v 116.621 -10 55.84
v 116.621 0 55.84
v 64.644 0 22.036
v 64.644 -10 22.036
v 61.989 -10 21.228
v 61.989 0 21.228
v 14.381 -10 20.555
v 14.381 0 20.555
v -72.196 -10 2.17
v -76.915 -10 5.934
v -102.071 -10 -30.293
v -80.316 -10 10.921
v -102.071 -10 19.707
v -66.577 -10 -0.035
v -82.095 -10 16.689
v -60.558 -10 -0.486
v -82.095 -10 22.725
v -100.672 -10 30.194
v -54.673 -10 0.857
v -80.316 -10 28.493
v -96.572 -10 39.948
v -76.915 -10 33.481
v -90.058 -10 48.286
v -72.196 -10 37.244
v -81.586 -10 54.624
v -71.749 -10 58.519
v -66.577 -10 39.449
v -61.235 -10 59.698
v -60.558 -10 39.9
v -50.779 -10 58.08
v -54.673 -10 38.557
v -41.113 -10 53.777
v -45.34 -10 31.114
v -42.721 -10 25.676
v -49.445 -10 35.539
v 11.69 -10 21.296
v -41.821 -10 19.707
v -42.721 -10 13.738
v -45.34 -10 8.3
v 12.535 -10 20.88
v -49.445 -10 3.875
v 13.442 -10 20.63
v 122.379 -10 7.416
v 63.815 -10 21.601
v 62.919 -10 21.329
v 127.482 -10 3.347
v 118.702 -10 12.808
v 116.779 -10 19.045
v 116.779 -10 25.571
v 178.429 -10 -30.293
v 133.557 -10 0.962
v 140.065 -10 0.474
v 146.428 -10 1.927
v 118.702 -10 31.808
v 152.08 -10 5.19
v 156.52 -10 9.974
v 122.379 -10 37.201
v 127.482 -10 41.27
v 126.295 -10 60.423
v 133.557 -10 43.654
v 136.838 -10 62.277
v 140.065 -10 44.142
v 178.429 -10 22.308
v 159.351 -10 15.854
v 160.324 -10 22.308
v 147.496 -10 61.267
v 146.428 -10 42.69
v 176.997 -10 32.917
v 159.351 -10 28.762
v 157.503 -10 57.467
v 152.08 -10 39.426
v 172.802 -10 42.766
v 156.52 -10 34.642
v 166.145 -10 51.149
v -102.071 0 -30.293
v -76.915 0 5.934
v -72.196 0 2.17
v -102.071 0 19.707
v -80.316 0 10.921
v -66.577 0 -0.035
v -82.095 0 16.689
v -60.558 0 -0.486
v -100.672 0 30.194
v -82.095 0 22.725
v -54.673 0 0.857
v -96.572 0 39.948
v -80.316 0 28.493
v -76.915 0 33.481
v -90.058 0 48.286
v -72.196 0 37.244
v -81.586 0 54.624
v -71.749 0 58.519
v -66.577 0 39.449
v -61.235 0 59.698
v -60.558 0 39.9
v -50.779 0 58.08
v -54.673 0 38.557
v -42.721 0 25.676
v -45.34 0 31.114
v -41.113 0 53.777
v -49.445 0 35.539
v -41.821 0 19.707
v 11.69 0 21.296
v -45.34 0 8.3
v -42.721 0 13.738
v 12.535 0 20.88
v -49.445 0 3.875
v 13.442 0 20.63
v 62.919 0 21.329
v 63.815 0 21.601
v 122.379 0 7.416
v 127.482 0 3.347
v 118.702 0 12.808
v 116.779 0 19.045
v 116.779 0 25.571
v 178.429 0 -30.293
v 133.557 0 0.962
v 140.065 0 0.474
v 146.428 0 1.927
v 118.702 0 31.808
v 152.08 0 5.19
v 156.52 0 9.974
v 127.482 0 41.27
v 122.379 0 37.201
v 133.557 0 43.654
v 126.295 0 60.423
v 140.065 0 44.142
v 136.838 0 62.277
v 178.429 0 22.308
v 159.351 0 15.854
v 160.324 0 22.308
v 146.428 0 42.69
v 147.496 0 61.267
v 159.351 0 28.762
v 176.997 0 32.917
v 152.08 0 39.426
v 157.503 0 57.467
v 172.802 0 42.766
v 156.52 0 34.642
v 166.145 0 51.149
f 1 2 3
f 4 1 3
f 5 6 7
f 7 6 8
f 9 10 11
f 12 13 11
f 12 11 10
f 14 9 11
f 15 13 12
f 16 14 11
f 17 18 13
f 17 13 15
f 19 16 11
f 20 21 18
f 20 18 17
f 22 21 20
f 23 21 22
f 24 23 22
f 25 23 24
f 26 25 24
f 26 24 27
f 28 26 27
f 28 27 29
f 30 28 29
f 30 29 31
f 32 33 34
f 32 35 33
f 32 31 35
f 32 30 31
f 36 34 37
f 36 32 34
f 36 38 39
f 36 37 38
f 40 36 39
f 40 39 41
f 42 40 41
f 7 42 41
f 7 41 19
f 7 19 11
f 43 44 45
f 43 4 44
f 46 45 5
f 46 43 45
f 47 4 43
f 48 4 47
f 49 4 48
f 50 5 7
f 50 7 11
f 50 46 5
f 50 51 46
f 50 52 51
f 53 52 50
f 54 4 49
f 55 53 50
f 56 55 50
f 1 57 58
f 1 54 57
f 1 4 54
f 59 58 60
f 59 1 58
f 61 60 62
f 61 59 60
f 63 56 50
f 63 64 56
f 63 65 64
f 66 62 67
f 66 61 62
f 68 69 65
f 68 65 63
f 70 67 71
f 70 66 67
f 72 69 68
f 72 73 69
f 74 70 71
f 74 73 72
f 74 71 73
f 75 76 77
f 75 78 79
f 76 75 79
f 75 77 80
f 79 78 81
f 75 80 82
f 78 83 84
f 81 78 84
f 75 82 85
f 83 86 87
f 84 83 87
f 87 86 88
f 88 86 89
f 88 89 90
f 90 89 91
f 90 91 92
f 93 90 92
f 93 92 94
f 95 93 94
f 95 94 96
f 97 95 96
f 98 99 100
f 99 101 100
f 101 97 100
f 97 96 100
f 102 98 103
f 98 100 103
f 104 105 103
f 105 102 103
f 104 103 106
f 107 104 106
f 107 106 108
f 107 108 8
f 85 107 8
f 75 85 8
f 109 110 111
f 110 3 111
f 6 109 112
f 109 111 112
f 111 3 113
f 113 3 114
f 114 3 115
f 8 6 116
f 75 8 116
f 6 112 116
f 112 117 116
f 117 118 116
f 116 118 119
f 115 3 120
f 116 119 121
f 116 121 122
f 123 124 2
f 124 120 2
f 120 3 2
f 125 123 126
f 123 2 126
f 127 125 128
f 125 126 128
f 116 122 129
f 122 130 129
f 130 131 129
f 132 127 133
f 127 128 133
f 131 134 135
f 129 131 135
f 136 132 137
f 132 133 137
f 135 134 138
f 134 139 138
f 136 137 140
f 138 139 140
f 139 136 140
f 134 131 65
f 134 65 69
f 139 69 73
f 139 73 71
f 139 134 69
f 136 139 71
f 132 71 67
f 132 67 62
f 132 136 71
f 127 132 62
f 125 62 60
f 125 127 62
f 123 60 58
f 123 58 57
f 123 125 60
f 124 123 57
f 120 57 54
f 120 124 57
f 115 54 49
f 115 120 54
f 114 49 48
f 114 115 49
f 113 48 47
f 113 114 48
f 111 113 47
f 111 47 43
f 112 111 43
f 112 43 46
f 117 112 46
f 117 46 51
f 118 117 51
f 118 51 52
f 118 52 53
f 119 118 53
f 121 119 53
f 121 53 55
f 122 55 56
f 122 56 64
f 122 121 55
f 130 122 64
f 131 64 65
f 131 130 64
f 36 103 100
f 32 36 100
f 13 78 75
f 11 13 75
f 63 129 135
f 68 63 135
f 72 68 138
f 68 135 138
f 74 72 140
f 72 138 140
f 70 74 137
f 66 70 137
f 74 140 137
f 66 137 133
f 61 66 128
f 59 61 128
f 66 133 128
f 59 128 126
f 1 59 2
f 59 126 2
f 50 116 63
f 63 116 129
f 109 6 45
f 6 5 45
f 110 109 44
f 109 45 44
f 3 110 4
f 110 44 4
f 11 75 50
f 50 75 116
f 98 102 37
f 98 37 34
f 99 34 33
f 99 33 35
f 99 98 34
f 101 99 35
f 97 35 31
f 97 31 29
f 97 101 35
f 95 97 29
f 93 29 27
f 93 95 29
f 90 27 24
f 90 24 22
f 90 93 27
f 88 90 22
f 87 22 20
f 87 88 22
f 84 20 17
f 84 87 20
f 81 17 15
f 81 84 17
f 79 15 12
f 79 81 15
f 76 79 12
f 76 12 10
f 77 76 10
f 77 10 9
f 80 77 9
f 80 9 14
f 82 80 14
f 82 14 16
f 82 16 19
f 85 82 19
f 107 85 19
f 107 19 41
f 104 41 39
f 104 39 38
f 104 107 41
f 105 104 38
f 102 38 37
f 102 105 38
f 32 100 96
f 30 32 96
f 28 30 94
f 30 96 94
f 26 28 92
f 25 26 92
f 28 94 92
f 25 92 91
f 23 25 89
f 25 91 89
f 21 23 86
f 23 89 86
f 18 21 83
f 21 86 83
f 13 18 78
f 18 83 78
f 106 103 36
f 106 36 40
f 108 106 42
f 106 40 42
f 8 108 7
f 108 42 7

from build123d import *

# Parameters (mm, degrees)
F0_R     = 20.25
F0_R_2   = 21.895042
F1_DEPTH = 10
F2_R     = 5


with BuildPart() as f1:
    # F0 (on Front) → F1 (new body)
    with BuildSketch(Plane.XZ):
        with BuildLine():
            Line((12.9277, 20.534305), (-41.112968, 53.777097))
            ThreePointArc((-41.112968, 53.777097), (-81.586066, 54.623564), (-102.070918, 19.707106))
            Line((-102.070918, 19.707106), (-102.070918, -30.292894))
            Line((-102.070918, -30.292894), (178.429082, -30.292894))
            Line((178.429082, -30.292894), (178.429082, 22.308165))
            ThreePointArc((178.429082, 22.308165), (157.503454, 57.467351), (116.620665, 55.840134))
            Line((116.620665, 55.840134), (63.433077, 21.248158))
            Line((63.433077, 21.248158), (12.9277, 20.534305))
        make_face()
        with Locations((-62.070918, 19.707106)):
            Circle(F0_R, mode=Mode.SUBTRACT)
        with Locations((138.429082, 22.308165)):
            Circle(F0_R_2, mode=Mode.SUBTRACT)
    extrude(amount=F1_DEPTH)

    # F2
    f2_edges = [f1.edges().sort_by_distance(p)[0] for p in [
        (12.9277, -5, 20.534305),
        (63.433077, -5, 21.248158),
    ]]
    fillet(f2_edges, radius=F2_R)


solid = f1.part
